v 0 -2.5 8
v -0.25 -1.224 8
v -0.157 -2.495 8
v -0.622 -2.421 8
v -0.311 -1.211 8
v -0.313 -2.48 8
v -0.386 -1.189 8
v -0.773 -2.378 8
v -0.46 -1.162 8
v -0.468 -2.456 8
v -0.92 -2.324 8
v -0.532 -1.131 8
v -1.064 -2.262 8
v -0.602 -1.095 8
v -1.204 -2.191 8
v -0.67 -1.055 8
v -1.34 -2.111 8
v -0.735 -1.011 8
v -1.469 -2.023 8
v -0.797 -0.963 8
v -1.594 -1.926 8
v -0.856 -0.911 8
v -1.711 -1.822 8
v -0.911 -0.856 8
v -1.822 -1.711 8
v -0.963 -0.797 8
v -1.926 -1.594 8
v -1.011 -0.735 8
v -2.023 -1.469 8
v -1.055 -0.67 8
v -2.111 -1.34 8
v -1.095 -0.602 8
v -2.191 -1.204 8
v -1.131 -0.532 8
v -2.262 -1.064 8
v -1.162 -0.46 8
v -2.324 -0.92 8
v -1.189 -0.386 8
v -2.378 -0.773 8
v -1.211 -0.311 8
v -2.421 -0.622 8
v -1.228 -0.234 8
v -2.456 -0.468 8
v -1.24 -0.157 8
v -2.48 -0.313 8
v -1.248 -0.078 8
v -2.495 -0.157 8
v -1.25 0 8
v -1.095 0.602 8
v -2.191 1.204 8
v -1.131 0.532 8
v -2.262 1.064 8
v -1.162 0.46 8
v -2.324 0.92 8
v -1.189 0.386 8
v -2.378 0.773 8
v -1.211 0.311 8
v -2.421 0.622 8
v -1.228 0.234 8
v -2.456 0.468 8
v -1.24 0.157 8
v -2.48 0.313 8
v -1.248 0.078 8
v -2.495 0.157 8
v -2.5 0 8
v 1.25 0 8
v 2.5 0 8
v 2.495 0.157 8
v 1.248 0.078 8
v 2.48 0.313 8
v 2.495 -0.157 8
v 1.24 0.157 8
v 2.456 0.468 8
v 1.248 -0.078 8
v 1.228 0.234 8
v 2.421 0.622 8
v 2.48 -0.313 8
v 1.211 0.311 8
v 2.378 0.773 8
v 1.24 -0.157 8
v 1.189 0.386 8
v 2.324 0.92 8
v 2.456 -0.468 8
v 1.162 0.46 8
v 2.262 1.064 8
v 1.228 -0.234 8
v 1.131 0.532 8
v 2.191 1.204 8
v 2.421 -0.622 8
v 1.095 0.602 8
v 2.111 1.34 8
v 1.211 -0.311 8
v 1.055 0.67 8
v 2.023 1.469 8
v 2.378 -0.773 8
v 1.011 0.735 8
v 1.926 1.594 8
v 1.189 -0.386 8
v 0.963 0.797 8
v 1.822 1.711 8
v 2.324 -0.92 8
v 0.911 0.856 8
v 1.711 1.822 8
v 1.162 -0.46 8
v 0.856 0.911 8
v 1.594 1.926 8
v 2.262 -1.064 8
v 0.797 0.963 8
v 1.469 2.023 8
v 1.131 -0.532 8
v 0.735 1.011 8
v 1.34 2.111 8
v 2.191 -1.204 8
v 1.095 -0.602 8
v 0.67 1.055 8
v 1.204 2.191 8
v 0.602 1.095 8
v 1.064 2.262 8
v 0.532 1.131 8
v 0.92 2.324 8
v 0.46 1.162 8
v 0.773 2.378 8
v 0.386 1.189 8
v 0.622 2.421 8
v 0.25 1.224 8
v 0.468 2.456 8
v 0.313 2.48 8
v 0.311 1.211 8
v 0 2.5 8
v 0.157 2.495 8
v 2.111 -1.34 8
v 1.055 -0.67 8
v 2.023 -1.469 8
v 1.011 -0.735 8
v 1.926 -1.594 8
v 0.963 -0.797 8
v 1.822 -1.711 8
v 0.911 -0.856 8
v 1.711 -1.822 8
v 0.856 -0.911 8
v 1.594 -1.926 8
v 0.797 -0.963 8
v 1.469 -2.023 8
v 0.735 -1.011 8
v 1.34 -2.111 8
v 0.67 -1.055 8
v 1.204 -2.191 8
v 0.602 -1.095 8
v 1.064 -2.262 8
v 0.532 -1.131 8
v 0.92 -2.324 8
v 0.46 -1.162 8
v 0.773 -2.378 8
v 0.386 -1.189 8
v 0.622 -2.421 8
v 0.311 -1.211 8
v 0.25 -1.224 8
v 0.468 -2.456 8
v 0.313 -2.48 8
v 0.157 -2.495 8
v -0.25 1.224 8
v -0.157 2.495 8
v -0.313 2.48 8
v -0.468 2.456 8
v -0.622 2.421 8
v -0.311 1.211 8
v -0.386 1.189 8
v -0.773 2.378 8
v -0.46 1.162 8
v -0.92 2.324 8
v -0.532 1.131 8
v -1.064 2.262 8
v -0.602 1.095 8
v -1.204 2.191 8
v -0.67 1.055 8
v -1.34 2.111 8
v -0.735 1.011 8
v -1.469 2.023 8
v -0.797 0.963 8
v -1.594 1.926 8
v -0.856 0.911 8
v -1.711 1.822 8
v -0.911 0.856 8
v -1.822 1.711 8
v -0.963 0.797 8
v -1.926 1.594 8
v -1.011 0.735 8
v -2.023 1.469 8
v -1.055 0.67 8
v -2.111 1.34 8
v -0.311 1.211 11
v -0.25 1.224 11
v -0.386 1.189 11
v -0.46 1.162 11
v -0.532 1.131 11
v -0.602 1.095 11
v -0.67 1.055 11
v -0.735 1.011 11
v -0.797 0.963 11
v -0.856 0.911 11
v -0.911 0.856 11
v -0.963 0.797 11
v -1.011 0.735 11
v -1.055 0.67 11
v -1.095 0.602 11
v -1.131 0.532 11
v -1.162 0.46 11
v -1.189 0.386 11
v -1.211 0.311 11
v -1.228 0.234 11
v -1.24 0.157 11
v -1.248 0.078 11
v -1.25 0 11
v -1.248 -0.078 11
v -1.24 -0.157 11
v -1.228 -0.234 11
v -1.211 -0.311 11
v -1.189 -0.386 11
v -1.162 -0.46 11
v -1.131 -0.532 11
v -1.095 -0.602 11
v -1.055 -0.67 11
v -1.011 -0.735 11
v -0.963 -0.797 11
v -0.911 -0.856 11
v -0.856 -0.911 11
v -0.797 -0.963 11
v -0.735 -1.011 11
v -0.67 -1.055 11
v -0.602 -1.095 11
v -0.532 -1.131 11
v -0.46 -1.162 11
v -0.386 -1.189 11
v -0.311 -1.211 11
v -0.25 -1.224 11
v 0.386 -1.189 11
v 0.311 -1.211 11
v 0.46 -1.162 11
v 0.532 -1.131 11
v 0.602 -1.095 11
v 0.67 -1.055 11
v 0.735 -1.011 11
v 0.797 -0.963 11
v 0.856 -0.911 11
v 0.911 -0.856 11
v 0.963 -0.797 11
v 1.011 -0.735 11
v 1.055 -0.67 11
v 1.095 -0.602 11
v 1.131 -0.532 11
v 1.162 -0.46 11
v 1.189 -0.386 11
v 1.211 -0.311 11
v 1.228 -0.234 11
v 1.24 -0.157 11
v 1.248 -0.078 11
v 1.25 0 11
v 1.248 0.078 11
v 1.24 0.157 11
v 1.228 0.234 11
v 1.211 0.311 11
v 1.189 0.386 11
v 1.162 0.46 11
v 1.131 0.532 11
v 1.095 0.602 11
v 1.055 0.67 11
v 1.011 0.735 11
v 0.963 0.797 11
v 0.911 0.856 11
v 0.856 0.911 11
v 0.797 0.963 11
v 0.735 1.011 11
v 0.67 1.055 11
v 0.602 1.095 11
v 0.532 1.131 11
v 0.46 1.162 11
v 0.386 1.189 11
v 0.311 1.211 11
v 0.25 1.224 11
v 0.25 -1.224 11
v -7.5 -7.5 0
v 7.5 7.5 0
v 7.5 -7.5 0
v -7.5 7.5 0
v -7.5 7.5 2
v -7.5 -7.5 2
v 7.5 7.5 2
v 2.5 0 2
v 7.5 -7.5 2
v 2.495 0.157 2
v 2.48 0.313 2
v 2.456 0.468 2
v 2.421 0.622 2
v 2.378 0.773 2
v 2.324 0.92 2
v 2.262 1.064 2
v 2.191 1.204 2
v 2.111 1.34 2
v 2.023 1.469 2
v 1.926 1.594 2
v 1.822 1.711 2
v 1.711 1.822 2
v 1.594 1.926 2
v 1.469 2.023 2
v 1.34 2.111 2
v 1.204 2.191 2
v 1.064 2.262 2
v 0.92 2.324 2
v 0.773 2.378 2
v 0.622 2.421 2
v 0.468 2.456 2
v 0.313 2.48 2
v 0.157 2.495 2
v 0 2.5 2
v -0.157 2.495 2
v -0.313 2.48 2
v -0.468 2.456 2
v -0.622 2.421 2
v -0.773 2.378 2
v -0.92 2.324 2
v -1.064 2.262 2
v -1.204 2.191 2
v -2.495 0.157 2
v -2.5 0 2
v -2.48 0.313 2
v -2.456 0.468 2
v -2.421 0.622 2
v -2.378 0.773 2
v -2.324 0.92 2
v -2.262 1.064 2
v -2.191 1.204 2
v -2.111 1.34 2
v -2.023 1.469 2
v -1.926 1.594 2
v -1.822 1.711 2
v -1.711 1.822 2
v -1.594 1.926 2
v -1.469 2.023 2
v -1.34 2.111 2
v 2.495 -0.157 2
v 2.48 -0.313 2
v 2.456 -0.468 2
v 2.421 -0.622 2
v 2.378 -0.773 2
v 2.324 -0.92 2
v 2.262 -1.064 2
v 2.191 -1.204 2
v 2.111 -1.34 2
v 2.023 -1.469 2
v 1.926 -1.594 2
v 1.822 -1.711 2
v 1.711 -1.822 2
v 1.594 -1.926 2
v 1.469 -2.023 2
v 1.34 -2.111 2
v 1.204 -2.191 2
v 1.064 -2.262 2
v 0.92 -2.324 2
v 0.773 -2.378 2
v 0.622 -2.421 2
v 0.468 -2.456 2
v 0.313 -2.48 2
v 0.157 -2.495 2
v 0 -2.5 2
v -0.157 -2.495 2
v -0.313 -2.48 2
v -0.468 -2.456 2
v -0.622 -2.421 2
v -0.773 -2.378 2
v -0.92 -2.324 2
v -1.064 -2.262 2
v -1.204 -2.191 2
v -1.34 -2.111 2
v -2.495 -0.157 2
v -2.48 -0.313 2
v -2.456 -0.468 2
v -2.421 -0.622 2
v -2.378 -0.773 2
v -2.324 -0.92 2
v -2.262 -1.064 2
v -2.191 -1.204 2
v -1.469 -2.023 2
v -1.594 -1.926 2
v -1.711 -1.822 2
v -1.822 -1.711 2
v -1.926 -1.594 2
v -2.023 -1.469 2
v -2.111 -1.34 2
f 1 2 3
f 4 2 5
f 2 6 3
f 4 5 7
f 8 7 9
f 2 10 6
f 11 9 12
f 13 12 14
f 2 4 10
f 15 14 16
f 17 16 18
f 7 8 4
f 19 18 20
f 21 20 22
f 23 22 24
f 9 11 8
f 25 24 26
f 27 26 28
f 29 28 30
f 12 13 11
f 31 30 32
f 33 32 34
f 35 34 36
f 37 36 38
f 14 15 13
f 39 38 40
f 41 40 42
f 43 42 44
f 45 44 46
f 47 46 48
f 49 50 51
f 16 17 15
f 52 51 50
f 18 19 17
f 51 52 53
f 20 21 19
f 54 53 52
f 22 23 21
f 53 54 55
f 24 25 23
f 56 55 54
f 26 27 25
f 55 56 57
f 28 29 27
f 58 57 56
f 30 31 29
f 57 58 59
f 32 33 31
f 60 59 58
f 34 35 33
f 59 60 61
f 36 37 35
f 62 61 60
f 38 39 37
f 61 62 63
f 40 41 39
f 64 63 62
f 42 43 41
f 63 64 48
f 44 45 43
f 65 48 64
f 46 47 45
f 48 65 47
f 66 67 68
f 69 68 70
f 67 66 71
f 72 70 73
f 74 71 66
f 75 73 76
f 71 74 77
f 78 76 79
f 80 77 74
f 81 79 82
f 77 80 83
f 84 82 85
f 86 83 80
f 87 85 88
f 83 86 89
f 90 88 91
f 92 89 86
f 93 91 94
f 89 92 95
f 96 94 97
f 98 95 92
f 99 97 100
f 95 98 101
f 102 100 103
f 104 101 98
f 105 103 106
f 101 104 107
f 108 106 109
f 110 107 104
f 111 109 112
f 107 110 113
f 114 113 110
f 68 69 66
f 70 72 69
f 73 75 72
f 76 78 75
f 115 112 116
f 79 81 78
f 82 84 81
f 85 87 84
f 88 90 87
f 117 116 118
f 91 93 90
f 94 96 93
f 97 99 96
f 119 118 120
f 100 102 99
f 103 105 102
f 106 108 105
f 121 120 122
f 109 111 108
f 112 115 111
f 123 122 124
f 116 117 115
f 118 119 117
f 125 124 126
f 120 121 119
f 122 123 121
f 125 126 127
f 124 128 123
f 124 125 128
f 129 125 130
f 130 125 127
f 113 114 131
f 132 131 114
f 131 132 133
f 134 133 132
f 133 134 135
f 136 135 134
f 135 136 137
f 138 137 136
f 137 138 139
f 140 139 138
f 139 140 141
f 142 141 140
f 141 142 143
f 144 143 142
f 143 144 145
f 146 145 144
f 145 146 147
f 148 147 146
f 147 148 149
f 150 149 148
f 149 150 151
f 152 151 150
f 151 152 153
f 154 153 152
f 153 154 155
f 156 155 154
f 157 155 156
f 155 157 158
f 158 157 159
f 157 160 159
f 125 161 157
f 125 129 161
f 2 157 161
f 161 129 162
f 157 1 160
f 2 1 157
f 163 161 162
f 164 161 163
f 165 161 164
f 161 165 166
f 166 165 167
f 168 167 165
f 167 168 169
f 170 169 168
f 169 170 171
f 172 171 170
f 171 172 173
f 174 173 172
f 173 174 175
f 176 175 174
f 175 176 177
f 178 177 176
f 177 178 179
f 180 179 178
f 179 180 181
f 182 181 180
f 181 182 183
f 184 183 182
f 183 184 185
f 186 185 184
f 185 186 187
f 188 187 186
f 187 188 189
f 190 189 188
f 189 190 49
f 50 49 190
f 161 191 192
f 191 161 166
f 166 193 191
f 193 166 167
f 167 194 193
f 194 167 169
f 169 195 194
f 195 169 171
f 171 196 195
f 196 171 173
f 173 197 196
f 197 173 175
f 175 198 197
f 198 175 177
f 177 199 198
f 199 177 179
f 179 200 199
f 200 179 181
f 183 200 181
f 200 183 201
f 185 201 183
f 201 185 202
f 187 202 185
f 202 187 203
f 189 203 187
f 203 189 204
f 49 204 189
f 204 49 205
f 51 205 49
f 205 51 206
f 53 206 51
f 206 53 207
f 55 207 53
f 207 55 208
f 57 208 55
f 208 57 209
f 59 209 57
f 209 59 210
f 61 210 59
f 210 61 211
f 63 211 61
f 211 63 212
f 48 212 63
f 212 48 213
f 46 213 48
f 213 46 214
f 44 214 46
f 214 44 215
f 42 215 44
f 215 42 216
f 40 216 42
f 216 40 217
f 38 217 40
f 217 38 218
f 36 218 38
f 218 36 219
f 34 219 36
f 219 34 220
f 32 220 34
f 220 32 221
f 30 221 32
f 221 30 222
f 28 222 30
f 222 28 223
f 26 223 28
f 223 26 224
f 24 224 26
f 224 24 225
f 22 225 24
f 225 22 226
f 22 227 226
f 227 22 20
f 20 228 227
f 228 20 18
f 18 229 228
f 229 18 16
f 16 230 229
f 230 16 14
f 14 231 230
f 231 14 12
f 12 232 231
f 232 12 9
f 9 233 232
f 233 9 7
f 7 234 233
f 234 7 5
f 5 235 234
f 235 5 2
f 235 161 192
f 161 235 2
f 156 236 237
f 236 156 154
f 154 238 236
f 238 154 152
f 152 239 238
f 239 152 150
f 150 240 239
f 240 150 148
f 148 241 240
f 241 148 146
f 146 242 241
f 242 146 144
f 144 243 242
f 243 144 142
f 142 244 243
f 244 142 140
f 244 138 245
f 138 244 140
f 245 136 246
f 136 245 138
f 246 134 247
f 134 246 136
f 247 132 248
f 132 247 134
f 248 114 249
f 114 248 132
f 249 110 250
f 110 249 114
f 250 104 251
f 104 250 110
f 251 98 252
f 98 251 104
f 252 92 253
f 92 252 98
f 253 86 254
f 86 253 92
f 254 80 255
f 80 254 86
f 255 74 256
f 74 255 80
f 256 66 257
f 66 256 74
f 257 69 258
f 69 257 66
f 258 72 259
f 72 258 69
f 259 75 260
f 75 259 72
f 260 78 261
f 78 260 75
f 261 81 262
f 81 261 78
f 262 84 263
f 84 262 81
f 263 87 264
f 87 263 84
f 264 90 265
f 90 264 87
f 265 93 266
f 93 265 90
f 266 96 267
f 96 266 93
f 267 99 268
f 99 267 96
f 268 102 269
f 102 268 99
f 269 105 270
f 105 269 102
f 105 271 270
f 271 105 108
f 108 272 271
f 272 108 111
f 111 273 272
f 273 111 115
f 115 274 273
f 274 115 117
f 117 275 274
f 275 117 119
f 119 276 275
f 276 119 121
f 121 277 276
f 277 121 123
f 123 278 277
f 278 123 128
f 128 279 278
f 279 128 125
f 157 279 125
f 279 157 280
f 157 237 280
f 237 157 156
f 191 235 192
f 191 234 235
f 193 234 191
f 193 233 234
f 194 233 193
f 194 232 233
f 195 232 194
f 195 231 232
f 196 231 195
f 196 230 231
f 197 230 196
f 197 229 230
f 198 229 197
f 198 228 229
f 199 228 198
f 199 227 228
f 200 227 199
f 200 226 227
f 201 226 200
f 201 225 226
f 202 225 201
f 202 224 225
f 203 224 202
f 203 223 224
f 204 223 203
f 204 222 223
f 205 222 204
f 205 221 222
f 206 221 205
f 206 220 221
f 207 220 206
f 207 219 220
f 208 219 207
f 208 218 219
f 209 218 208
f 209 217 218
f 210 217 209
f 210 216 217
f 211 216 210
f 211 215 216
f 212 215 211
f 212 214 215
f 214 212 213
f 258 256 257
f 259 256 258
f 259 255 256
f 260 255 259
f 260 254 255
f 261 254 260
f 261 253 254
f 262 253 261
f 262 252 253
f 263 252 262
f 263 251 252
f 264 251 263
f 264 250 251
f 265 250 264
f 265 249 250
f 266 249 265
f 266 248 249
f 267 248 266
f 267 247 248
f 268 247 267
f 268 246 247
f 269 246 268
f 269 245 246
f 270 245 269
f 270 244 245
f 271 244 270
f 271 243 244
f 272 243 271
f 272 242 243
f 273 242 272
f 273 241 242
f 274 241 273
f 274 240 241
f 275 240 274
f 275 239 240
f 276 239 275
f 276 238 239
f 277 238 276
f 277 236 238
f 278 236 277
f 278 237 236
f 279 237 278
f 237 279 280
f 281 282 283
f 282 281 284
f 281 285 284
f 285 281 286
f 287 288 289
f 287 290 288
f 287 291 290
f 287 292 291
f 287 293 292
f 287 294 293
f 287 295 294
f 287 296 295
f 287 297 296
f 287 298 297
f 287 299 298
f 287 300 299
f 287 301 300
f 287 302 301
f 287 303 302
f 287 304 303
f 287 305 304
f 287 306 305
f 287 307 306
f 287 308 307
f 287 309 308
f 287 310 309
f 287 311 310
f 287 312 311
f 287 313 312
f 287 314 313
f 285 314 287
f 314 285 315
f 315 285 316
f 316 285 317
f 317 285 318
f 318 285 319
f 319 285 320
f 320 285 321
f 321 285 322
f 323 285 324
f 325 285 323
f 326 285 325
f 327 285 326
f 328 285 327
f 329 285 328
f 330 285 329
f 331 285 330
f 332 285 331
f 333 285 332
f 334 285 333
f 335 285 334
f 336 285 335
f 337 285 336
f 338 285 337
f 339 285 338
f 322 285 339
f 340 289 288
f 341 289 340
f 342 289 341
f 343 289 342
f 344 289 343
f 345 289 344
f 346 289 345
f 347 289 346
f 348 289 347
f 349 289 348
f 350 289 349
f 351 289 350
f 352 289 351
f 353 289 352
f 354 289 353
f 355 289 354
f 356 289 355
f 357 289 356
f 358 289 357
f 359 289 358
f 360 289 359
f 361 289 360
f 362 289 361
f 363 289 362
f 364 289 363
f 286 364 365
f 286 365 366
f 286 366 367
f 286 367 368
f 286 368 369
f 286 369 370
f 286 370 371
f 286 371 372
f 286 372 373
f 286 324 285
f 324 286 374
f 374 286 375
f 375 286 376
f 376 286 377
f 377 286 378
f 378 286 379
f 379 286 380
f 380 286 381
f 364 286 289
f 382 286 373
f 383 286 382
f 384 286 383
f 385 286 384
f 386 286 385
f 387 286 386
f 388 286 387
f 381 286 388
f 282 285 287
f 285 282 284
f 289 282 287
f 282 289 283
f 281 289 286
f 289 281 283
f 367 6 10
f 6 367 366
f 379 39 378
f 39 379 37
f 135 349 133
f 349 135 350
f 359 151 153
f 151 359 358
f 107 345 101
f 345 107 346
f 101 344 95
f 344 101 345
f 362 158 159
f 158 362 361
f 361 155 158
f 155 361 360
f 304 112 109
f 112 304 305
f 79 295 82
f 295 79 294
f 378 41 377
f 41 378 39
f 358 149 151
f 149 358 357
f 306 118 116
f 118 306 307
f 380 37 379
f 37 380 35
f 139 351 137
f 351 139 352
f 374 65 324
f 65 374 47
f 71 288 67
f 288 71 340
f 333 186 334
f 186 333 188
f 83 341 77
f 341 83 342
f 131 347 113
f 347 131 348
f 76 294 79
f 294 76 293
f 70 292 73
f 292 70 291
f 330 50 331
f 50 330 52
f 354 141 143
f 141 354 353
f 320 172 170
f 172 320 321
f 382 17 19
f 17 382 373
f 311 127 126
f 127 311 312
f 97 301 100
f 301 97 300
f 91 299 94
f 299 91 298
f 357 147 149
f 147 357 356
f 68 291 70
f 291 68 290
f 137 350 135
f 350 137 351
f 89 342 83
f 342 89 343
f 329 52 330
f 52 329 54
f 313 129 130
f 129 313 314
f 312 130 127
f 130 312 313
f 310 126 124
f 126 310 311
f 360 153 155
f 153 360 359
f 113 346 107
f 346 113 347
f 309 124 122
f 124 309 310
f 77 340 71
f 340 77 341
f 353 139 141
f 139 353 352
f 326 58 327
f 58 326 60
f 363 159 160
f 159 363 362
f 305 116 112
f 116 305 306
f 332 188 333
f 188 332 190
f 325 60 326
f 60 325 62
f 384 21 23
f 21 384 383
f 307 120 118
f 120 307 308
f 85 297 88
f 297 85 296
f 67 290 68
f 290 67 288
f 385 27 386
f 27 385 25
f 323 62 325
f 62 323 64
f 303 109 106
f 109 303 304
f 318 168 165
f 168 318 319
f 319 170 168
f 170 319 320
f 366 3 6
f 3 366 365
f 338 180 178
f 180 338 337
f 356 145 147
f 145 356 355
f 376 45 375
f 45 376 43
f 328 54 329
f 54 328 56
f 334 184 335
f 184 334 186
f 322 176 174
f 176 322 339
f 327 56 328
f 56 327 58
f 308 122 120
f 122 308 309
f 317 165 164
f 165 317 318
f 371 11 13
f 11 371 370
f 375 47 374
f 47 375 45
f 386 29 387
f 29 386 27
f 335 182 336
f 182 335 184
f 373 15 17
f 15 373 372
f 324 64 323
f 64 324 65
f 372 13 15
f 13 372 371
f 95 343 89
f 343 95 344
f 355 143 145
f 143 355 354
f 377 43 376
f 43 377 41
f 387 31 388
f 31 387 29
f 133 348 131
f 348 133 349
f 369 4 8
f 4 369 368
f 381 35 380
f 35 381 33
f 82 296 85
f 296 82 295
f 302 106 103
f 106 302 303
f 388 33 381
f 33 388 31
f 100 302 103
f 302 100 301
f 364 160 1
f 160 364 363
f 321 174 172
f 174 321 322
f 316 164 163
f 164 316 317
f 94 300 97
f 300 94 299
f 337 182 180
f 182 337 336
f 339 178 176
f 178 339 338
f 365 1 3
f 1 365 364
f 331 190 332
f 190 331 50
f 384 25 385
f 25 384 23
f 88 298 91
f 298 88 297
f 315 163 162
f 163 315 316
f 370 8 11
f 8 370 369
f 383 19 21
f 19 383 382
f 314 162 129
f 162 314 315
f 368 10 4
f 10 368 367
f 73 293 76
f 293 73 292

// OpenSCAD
/* PC Board Standoffs */

$fn=100;

hole_diameter=3;
tape_width=15;
standoff_height=8;
board_thickness=2;

base_thickness=2;
post_length=standoff_height-base_thickness;
pin_length=3;

base_side=tape_width;
post_dia=hole_diameter+2;
pin_dia=hole_diameter-0.5;

/* A square base to stick to an enclosure with double sided tape
*/
module base(side_length, thickness) {
    linear_extrude(height=thickness)
        square([side_length, side_length], center=true);
}

/* A post for the PCB to rest on. Should be slightly wider
   than the hole on the PCB
*/
module post(diameter, length) {
    linear_extrude(height=length)
        circle(d=diameter);
}

/* A pin on top to set the PCB onto. Can be melted or glued to secure.
   TODO: form a clip by splitting the pin, and giving it a bulge
*/
module pin(diameter, length) {
    /* Make the first part of the pin an exact fit */
    linear_extrude(height=board_thickness) {
        difference() {
            circle(d=diameter);
            square([0.5, diameter], center=true);
        }
    }
    /* TODO: Make the next part with a small bulge... */
    translate([0,0,board_thickness]) {
        linear_extrude(height=length-board_thickness) {
            difference() {
                circle(d=diameter);
                square([0.5, diameter], center=true);
            }
        }
    }
    /* Musings...
    translate([0,0,board_thickness]) {
        hull() {
            linear_extrude(height=length-board_thickness) {
                difference() {
                    circle(d=diameter);
                    square([0.5, diameter], center=true);
                }
            }
            translate([0,0,board_thickness/2])
            linear_extrude(height=0.1)
                difference() {
                    circle(d=diameter+0.5);
                    square([0.5, diameter+0.5], center=true);
                }
        }
    }
    */
}

/* The completed standoff */
module standoff(base_side_length, post_diameter, pin_diameter) {
    base(base_side_length, base_thickness);
    translate([0,0,base_thickness])
        post(post_diameter, post_length);
    translate([0,0,base_thickness+post_length])
        pin(pin_diameter, pin_length);
}

standoff(base_side, post_dia, pin_dia);
